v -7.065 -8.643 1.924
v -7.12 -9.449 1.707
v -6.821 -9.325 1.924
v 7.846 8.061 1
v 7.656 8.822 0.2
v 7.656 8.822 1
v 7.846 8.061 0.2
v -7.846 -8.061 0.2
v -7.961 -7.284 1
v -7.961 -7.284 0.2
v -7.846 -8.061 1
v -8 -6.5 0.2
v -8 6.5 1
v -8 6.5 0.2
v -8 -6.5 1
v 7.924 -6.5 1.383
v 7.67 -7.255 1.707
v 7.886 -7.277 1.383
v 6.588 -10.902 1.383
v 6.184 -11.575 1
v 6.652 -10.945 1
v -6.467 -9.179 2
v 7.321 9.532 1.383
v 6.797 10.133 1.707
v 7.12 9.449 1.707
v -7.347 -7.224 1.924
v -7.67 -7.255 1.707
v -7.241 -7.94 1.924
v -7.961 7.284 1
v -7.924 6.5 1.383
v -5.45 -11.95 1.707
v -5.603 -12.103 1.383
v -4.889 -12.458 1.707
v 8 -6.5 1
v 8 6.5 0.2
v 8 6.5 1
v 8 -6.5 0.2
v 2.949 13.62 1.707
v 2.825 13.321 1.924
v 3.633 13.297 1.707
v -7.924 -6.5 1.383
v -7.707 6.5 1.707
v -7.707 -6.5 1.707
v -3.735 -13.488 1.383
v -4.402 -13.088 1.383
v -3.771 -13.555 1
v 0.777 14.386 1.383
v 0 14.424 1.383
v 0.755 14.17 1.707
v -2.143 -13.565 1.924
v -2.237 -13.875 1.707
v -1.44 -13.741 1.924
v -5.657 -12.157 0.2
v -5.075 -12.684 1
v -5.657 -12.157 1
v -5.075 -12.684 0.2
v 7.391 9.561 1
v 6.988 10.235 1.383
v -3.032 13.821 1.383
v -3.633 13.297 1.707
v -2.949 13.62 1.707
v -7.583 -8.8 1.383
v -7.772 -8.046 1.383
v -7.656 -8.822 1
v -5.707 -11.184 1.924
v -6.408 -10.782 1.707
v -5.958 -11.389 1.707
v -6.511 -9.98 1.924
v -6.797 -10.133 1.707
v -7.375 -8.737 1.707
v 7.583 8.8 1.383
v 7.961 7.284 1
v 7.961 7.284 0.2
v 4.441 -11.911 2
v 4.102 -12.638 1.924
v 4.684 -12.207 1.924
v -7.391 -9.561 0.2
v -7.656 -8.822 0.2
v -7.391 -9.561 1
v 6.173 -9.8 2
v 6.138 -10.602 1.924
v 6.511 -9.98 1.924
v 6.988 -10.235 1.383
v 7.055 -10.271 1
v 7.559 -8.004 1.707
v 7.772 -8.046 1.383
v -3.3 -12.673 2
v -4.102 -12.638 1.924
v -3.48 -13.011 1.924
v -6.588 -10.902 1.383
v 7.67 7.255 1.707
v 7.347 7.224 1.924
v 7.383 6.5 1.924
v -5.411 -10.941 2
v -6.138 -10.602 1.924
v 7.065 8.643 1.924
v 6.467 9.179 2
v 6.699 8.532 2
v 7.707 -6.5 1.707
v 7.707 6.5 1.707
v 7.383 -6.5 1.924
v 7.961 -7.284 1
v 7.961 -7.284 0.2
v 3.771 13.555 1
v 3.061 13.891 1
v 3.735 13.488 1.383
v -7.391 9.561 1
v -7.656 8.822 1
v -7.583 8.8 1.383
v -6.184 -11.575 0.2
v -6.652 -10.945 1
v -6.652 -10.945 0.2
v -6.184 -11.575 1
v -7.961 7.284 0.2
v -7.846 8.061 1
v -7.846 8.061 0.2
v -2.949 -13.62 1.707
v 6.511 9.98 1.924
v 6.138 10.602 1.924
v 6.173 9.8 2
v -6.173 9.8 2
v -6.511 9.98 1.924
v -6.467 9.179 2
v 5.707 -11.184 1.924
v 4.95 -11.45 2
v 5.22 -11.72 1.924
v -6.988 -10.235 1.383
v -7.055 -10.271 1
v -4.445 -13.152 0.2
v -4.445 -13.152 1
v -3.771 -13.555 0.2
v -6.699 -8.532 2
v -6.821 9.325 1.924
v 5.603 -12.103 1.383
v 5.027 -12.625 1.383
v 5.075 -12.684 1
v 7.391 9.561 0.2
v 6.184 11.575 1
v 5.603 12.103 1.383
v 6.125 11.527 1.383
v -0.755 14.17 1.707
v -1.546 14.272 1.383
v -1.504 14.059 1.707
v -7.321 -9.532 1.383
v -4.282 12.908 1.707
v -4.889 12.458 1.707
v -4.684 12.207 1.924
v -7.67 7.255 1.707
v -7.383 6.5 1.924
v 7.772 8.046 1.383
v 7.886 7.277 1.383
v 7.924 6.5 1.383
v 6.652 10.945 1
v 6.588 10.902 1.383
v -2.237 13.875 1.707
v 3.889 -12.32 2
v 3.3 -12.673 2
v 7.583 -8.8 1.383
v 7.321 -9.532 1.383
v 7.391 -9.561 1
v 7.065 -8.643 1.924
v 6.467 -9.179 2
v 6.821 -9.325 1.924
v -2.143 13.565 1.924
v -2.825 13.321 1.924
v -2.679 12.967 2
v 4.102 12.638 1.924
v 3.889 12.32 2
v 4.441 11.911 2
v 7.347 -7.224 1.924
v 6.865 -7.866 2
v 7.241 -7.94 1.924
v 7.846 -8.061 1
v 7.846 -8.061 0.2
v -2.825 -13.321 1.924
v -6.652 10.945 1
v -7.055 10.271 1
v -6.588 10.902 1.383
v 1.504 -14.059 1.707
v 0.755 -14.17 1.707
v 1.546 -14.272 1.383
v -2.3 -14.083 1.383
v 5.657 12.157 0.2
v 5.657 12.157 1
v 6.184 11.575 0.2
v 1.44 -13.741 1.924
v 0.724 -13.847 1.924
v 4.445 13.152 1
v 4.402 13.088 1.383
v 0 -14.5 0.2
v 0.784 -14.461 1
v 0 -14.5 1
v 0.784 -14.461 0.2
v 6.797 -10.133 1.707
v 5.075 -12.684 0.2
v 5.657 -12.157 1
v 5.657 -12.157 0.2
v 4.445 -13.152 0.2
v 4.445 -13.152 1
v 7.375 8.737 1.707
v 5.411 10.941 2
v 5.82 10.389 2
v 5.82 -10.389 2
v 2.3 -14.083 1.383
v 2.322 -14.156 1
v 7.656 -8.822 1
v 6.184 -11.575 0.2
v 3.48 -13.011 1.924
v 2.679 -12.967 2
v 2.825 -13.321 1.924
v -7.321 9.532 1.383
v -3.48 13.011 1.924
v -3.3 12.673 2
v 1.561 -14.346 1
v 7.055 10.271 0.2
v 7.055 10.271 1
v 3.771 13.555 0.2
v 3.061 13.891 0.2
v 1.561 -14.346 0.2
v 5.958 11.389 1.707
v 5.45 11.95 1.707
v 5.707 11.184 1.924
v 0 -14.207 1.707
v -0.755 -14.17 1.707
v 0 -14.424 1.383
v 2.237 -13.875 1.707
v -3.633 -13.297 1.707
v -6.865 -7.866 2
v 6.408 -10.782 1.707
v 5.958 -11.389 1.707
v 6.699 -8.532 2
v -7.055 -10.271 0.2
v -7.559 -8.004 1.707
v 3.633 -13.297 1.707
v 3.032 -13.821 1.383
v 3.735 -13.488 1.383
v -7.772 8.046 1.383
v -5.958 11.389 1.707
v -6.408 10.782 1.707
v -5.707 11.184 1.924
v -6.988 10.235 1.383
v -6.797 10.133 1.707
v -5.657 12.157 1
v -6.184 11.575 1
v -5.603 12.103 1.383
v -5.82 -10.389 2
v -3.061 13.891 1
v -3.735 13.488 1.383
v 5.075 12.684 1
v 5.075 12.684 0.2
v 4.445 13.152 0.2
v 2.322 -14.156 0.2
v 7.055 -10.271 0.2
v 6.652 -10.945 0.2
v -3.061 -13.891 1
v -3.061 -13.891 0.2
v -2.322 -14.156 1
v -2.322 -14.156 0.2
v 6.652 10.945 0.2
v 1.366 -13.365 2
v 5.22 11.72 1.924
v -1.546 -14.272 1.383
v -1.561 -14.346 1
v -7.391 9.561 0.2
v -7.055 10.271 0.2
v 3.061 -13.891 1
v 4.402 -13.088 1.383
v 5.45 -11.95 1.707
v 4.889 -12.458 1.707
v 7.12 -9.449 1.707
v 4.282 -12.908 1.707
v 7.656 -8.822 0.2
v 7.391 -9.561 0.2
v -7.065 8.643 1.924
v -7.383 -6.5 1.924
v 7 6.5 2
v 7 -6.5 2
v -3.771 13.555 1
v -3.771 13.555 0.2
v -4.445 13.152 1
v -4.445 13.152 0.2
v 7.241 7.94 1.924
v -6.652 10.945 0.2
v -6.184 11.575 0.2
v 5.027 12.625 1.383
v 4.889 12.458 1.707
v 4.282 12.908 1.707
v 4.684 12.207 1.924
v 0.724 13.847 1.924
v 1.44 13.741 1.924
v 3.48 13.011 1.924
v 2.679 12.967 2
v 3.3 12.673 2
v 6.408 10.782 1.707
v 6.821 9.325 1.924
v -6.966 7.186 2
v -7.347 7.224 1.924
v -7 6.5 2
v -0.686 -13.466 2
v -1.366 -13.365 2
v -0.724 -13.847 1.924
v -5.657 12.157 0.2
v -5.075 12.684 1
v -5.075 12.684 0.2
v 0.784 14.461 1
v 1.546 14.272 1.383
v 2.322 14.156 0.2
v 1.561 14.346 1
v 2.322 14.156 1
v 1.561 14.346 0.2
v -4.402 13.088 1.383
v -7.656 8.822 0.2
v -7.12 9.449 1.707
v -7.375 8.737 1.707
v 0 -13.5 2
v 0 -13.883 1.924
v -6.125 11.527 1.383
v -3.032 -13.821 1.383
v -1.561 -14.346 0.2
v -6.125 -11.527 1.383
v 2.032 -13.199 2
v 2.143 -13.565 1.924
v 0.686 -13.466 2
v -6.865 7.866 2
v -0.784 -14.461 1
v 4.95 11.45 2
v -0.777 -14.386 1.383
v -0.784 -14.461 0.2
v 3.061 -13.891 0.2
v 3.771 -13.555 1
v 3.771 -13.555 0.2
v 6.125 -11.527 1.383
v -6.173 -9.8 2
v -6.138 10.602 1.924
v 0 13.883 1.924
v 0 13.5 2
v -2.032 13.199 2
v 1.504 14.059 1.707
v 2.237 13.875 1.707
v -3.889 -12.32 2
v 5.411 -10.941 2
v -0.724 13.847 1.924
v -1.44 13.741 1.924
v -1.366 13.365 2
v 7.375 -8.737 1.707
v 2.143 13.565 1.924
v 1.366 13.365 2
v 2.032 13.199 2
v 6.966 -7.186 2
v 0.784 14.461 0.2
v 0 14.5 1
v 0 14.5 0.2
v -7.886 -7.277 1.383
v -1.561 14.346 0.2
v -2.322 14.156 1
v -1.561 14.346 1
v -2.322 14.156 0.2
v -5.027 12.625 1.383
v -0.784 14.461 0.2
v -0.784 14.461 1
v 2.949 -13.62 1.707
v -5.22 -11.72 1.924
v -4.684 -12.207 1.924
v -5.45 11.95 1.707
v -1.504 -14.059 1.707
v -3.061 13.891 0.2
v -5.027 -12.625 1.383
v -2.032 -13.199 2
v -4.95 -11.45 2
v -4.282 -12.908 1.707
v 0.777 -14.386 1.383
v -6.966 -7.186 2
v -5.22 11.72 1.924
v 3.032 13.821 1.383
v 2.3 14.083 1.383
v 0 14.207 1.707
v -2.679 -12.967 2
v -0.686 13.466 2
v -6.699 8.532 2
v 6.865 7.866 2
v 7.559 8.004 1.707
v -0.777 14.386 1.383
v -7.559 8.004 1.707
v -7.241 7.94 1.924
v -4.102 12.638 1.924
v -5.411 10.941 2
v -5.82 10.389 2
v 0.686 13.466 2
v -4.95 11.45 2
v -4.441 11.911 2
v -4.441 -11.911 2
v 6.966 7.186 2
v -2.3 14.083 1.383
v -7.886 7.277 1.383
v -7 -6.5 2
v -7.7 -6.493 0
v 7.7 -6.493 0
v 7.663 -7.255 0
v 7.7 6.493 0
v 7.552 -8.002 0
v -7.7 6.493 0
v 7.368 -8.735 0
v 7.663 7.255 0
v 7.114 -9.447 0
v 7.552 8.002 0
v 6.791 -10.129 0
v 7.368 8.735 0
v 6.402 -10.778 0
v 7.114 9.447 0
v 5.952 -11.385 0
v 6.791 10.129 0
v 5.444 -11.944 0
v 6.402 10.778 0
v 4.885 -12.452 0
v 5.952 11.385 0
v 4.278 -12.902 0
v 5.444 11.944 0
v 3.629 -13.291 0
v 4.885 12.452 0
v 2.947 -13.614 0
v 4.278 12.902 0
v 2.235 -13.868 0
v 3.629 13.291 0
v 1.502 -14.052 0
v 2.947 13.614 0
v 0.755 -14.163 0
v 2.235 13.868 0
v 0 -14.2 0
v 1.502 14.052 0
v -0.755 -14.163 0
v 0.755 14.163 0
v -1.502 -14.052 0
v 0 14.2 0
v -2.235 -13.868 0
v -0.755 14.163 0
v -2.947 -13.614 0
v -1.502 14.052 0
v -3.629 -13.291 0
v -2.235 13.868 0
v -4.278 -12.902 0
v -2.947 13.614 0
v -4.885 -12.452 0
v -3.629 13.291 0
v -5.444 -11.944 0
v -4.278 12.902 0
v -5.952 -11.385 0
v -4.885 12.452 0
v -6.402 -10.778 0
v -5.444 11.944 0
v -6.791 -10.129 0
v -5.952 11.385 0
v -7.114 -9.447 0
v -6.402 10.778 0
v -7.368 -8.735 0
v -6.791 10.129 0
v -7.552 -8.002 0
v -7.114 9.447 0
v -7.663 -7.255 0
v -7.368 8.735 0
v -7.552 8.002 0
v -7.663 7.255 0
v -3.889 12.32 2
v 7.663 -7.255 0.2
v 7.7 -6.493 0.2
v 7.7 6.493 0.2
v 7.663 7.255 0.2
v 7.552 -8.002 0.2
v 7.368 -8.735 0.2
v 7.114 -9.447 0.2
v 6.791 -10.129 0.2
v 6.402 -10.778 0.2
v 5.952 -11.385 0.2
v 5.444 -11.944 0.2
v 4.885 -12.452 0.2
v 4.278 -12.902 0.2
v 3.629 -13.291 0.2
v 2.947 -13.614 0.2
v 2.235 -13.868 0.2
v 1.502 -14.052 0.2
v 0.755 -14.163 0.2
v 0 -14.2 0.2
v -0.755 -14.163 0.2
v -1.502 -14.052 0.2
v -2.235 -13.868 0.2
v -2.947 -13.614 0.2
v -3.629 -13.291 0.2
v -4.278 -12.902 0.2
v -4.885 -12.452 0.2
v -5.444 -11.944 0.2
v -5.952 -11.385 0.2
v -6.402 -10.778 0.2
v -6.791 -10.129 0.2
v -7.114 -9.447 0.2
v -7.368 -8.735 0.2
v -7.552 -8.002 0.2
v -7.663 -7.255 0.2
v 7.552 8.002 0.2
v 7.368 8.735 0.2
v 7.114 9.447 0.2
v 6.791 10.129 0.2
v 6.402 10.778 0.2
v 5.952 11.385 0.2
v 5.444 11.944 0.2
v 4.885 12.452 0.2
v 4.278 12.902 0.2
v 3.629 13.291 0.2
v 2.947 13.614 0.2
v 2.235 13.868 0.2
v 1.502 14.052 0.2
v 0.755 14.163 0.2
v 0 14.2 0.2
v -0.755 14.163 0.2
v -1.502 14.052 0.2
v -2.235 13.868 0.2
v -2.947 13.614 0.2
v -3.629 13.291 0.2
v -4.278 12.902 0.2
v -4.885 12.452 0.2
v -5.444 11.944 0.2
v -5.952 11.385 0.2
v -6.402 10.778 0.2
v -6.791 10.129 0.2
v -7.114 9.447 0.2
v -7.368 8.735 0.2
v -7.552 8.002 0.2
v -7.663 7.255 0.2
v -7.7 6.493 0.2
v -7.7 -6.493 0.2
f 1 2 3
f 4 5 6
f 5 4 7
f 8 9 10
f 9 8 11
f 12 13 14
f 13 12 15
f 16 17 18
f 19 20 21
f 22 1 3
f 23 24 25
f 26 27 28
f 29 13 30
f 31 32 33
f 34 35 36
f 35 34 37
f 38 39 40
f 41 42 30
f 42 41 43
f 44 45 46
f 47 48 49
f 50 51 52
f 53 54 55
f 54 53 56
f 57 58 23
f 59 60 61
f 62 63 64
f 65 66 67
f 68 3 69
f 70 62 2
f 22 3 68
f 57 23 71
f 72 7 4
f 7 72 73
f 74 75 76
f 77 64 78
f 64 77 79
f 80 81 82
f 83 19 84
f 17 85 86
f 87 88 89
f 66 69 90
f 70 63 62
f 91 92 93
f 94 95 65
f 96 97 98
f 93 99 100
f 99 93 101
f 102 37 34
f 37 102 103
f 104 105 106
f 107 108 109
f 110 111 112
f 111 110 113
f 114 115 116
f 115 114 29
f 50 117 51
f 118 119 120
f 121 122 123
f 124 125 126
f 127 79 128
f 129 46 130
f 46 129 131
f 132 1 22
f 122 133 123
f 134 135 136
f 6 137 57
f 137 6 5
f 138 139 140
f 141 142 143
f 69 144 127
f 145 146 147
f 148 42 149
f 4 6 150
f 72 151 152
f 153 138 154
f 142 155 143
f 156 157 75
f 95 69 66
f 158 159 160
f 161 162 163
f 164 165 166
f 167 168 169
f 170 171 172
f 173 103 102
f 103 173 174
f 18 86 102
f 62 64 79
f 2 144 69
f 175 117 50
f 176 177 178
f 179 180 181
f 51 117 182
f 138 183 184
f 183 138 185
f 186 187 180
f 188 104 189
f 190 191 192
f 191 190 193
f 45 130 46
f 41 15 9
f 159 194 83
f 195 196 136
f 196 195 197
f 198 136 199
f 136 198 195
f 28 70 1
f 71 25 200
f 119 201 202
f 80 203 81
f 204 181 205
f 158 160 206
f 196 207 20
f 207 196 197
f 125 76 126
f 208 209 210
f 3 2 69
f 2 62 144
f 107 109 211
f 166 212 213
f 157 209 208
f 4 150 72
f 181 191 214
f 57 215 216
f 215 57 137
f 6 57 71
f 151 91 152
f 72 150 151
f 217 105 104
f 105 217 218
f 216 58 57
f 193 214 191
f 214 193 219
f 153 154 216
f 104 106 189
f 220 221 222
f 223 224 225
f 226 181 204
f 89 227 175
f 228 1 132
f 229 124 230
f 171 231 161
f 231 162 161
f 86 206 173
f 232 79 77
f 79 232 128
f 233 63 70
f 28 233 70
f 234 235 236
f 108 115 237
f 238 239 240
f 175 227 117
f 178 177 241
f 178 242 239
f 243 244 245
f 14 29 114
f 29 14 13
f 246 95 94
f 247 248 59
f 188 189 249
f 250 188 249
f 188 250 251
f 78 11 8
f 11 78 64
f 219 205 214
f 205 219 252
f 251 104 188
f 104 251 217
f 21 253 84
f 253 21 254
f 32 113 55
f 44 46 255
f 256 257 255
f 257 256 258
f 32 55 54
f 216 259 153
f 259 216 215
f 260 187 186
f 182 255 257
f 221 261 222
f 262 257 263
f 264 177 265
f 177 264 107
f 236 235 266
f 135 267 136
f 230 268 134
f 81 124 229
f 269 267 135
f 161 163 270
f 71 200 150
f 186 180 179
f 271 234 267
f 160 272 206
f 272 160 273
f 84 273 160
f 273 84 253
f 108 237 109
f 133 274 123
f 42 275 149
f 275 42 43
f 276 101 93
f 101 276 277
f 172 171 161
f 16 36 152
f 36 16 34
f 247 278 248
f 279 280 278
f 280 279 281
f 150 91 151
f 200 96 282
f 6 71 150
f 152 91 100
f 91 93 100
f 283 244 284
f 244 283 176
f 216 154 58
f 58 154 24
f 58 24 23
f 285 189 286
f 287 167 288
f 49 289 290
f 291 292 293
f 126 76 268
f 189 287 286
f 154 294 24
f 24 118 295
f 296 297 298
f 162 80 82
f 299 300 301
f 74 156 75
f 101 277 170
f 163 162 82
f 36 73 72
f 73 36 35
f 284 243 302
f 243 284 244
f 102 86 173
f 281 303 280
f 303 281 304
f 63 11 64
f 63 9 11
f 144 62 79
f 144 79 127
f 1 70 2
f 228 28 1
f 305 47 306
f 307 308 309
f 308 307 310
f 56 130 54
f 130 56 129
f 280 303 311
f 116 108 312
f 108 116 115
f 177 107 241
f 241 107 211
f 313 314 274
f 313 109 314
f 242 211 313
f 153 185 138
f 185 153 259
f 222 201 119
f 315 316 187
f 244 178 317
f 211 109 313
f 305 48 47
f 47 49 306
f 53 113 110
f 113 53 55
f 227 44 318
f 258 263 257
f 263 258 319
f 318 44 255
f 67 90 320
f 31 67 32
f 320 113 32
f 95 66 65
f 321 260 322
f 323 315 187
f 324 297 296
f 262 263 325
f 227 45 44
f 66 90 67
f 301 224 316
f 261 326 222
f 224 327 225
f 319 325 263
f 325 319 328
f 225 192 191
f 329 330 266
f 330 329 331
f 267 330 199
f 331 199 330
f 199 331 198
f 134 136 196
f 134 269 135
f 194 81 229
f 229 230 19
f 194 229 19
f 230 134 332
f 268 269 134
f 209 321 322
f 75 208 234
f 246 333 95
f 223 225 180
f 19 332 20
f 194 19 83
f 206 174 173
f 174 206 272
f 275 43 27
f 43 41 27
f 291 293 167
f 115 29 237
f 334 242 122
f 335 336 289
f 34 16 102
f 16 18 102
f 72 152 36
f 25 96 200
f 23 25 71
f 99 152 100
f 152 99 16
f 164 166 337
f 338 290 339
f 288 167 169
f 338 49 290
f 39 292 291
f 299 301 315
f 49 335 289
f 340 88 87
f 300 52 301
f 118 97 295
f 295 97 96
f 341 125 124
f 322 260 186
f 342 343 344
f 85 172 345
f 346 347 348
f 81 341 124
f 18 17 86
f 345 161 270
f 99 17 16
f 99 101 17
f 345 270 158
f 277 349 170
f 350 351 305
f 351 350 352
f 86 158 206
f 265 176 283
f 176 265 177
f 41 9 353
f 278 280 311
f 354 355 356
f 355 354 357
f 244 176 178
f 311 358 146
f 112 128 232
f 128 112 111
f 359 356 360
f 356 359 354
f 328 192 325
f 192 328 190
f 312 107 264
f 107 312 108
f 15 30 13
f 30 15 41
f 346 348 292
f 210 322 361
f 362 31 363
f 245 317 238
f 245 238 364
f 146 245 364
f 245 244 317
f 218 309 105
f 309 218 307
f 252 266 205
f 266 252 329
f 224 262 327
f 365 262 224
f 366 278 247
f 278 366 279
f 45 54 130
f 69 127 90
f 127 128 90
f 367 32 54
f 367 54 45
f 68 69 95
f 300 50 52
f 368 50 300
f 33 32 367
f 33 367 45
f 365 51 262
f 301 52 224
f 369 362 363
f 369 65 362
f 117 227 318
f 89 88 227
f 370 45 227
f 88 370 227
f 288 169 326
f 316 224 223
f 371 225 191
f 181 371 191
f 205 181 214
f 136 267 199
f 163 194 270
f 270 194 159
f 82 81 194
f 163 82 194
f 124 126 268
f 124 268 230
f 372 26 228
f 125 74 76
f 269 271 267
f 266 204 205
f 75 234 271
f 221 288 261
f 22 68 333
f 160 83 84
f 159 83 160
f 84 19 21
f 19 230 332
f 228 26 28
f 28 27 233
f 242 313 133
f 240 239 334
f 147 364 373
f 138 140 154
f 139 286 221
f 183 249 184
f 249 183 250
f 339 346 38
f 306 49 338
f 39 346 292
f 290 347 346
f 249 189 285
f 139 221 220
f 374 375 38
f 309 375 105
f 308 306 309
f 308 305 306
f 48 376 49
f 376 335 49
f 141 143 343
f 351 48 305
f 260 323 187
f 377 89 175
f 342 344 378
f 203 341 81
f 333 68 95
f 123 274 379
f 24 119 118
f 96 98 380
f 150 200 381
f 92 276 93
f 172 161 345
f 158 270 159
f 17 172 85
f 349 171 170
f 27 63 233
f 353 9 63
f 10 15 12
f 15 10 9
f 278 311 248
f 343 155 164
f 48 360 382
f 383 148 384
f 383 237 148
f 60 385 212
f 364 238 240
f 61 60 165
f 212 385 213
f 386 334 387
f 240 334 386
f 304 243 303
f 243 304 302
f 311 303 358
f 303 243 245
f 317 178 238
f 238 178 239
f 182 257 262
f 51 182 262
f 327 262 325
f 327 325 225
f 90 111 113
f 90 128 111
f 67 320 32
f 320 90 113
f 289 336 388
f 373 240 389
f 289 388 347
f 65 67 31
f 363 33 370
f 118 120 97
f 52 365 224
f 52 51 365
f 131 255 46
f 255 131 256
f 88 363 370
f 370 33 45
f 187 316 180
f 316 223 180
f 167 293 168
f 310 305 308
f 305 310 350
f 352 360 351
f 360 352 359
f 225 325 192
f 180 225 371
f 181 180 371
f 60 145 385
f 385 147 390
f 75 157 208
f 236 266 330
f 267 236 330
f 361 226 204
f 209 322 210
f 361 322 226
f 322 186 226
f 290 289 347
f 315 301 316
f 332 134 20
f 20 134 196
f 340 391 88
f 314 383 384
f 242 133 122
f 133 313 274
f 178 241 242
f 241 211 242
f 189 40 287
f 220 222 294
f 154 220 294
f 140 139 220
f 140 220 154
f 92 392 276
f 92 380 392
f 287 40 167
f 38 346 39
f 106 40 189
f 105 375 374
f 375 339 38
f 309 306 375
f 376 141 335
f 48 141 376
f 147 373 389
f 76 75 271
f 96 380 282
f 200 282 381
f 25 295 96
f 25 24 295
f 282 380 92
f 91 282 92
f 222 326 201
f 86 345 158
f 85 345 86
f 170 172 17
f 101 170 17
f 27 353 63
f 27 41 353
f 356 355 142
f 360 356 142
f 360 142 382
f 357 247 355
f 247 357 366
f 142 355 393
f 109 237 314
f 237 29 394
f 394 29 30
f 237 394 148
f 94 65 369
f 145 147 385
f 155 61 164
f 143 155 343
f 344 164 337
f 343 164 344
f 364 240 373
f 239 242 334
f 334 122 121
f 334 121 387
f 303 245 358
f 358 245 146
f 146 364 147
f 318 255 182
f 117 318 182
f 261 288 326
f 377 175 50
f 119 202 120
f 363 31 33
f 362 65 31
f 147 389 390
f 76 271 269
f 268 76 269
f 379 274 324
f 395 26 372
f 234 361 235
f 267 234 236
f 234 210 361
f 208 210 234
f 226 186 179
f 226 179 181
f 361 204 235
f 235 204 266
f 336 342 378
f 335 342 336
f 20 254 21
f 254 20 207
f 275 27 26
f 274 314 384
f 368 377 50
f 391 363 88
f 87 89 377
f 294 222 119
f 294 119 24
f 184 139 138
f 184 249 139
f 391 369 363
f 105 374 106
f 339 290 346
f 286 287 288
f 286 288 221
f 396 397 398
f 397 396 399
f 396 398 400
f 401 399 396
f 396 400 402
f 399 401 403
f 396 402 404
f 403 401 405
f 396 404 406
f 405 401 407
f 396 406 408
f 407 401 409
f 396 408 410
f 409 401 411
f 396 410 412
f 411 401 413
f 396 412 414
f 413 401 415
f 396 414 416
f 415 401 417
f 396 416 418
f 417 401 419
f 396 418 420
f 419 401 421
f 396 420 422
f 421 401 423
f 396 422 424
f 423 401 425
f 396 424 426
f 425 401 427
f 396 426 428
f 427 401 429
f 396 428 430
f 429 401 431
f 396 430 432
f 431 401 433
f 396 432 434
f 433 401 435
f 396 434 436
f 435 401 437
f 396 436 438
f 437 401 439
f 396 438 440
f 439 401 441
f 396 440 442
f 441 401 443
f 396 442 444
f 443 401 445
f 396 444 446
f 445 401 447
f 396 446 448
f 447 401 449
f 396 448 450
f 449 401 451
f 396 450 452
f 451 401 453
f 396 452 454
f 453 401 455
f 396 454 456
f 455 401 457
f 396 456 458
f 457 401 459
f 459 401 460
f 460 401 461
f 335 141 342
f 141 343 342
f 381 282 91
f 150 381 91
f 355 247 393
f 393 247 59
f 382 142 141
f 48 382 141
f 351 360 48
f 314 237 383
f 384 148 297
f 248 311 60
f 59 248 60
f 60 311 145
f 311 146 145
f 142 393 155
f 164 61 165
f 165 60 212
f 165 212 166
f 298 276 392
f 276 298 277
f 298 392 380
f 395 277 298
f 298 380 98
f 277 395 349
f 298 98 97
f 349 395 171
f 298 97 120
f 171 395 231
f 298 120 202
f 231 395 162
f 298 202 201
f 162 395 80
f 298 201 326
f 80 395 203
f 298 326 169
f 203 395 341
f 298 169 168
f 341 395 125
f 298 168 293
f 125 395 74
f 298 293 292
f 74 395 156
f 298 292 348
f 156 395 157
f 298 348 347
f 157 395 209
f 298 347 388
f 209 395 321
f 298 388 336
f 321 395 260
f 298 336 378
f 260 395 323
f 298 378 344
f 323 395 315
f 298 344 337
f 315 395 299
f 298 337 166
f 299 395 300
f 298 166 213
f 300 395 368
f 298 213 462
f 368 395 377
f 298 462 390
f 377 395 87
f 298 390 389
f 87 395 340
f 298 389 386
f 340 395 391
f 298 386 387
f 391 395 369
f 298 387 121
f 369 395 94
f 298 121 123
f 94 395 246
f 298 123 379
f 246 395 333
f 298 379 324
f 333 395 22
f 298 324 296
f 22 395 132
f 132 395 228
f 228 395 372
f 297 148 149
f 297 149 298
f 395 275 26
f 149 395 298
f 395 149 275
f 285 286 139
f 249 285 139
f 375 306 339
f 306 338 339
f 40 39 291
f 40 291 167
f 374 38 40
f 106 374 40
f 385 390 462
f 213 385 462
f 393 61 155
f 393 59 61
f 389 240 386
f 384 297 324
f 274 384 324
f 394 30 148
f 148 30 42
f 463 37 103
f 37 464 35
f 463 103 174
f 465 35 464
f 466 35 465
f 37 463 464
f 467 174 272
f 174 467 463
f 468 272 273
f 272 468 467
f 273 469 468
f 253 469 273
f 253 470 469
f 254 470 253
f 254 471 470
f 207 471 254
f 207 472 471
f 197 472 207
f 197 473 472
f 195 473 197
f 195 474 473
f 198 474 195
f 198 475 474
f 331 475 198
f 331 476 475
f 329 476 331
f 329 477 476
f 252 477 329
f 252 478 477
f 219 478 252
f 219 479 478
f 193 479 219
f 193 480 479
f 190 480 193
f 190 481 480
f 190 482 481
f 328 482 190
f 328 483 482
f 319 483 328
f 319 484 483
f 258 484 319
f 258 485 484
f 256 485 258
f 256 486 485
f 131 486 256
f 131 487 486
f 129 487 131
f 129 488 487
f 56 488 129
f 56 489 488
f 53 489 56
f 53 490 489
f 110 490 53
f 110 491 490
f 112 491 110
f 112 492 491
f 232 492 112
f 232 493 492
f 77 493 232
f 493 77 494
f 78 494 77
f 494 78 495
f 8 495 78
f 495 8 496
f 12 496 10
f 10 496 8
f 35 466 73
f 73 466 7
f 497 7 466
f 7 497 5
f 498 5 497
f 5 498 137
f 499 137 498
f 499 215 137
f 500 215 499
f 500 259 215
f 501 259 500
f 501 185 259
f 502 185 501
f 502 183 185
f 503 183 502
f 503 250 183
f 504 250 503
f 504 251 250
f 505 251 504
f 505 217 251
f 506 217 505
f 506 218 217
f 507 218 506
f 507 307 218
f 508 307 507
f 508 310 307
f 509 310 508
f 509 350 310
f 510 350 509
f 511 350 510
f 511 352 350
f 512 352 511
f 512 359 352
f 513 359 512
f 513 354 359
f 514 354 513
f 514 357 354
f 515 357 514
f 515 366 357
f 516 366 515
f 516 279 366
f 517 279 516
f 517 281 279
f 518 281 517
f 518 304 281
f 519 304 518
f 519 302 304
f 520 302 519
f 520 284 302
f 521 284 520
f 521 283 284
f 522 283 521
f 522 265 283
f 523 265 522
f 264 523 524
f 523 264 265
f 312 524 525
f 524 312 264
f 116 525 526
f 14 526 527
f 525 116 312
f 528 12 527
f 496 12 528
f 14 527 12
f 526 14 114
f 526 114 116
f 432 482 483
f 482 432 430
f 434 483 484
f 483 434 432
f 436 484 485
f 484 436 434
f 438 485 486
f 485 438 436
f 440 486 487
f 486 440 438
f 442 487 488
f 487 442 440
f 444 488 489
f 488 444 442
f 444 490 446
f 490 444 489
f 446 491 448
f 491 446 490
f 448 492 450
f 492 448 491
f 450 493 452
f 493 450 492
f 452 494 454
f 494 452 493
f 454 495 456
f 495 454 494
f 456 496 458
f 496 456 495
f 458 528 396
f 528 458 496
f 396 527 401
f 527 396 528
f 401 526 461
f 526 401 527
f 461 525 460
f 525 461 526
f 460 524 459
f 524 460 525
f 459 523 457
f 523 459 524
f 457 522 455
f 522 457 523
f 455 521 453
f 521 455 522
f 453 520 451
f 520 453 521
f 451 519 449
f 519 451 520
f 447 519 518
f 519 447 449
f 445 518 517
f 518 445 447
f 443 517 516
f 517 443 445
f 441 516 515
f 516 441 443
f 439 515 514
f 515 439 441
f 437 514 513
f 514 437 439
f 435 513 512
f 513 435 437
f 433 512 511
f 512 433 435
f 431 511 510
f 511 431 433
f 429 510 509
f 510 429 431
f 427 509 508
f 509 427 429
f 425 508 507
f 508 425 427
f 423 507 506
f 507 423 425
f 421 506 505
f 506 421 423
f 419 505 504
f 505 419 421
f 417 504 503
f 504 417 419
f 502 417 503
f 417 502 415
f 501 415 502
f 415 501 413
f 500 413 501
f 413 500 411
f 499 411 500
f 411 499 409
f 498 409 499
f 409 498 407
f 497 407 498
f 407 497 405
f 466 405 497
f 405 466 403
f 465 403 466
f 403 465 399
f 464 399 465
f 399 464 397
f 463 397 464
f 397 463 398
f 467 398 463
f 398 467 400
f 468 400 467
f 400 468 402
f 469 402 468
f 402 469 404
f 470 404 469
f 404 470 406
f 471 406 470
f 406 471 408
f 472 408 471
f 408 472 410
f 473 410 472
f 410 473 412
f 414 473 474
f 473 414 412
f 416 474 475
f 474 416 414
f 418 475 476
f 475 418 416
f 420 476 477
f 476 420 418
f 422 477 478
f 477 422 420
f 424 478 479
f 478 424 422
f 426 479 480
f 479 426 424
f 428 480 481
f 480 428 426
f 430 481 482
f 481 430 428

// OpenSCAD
eps = 0.0001;

height = 2;
diamx = 16;
diamy = 29;
chamferx = 1;
chamfery = 1;

module profile_2d(diam) {
  translate([diam/2 - chamferx, height - chamfery])
    scale([chamferx, chamfery])
      circle(r=1, $fn=16);
  square([diam/2, height - chamfery]);
  square([diam/2 - chamferx, height]);
}

module base() {
  small_diam = min(diamx, diamy);
  
  hull()
    for(a = [-1, 1], b = [-1, 1])
      scale([a, b, 1])
        translate([(diamx - small_diam)/2, (diamy - small_diam)/2])
          rotate_extrude(angle=90, $fn=64)
            profile_2d(small_diam);
}

module print() {
  difference() {
    base();
    
    translate([0, 0, -eps]) {
      linear_extrude(0.2) {
        difference() {
          square(100, center=true);
          offset(-0.3)
            projection(cut=true)
              base();
        }
      }
    }
  }
}

print();
